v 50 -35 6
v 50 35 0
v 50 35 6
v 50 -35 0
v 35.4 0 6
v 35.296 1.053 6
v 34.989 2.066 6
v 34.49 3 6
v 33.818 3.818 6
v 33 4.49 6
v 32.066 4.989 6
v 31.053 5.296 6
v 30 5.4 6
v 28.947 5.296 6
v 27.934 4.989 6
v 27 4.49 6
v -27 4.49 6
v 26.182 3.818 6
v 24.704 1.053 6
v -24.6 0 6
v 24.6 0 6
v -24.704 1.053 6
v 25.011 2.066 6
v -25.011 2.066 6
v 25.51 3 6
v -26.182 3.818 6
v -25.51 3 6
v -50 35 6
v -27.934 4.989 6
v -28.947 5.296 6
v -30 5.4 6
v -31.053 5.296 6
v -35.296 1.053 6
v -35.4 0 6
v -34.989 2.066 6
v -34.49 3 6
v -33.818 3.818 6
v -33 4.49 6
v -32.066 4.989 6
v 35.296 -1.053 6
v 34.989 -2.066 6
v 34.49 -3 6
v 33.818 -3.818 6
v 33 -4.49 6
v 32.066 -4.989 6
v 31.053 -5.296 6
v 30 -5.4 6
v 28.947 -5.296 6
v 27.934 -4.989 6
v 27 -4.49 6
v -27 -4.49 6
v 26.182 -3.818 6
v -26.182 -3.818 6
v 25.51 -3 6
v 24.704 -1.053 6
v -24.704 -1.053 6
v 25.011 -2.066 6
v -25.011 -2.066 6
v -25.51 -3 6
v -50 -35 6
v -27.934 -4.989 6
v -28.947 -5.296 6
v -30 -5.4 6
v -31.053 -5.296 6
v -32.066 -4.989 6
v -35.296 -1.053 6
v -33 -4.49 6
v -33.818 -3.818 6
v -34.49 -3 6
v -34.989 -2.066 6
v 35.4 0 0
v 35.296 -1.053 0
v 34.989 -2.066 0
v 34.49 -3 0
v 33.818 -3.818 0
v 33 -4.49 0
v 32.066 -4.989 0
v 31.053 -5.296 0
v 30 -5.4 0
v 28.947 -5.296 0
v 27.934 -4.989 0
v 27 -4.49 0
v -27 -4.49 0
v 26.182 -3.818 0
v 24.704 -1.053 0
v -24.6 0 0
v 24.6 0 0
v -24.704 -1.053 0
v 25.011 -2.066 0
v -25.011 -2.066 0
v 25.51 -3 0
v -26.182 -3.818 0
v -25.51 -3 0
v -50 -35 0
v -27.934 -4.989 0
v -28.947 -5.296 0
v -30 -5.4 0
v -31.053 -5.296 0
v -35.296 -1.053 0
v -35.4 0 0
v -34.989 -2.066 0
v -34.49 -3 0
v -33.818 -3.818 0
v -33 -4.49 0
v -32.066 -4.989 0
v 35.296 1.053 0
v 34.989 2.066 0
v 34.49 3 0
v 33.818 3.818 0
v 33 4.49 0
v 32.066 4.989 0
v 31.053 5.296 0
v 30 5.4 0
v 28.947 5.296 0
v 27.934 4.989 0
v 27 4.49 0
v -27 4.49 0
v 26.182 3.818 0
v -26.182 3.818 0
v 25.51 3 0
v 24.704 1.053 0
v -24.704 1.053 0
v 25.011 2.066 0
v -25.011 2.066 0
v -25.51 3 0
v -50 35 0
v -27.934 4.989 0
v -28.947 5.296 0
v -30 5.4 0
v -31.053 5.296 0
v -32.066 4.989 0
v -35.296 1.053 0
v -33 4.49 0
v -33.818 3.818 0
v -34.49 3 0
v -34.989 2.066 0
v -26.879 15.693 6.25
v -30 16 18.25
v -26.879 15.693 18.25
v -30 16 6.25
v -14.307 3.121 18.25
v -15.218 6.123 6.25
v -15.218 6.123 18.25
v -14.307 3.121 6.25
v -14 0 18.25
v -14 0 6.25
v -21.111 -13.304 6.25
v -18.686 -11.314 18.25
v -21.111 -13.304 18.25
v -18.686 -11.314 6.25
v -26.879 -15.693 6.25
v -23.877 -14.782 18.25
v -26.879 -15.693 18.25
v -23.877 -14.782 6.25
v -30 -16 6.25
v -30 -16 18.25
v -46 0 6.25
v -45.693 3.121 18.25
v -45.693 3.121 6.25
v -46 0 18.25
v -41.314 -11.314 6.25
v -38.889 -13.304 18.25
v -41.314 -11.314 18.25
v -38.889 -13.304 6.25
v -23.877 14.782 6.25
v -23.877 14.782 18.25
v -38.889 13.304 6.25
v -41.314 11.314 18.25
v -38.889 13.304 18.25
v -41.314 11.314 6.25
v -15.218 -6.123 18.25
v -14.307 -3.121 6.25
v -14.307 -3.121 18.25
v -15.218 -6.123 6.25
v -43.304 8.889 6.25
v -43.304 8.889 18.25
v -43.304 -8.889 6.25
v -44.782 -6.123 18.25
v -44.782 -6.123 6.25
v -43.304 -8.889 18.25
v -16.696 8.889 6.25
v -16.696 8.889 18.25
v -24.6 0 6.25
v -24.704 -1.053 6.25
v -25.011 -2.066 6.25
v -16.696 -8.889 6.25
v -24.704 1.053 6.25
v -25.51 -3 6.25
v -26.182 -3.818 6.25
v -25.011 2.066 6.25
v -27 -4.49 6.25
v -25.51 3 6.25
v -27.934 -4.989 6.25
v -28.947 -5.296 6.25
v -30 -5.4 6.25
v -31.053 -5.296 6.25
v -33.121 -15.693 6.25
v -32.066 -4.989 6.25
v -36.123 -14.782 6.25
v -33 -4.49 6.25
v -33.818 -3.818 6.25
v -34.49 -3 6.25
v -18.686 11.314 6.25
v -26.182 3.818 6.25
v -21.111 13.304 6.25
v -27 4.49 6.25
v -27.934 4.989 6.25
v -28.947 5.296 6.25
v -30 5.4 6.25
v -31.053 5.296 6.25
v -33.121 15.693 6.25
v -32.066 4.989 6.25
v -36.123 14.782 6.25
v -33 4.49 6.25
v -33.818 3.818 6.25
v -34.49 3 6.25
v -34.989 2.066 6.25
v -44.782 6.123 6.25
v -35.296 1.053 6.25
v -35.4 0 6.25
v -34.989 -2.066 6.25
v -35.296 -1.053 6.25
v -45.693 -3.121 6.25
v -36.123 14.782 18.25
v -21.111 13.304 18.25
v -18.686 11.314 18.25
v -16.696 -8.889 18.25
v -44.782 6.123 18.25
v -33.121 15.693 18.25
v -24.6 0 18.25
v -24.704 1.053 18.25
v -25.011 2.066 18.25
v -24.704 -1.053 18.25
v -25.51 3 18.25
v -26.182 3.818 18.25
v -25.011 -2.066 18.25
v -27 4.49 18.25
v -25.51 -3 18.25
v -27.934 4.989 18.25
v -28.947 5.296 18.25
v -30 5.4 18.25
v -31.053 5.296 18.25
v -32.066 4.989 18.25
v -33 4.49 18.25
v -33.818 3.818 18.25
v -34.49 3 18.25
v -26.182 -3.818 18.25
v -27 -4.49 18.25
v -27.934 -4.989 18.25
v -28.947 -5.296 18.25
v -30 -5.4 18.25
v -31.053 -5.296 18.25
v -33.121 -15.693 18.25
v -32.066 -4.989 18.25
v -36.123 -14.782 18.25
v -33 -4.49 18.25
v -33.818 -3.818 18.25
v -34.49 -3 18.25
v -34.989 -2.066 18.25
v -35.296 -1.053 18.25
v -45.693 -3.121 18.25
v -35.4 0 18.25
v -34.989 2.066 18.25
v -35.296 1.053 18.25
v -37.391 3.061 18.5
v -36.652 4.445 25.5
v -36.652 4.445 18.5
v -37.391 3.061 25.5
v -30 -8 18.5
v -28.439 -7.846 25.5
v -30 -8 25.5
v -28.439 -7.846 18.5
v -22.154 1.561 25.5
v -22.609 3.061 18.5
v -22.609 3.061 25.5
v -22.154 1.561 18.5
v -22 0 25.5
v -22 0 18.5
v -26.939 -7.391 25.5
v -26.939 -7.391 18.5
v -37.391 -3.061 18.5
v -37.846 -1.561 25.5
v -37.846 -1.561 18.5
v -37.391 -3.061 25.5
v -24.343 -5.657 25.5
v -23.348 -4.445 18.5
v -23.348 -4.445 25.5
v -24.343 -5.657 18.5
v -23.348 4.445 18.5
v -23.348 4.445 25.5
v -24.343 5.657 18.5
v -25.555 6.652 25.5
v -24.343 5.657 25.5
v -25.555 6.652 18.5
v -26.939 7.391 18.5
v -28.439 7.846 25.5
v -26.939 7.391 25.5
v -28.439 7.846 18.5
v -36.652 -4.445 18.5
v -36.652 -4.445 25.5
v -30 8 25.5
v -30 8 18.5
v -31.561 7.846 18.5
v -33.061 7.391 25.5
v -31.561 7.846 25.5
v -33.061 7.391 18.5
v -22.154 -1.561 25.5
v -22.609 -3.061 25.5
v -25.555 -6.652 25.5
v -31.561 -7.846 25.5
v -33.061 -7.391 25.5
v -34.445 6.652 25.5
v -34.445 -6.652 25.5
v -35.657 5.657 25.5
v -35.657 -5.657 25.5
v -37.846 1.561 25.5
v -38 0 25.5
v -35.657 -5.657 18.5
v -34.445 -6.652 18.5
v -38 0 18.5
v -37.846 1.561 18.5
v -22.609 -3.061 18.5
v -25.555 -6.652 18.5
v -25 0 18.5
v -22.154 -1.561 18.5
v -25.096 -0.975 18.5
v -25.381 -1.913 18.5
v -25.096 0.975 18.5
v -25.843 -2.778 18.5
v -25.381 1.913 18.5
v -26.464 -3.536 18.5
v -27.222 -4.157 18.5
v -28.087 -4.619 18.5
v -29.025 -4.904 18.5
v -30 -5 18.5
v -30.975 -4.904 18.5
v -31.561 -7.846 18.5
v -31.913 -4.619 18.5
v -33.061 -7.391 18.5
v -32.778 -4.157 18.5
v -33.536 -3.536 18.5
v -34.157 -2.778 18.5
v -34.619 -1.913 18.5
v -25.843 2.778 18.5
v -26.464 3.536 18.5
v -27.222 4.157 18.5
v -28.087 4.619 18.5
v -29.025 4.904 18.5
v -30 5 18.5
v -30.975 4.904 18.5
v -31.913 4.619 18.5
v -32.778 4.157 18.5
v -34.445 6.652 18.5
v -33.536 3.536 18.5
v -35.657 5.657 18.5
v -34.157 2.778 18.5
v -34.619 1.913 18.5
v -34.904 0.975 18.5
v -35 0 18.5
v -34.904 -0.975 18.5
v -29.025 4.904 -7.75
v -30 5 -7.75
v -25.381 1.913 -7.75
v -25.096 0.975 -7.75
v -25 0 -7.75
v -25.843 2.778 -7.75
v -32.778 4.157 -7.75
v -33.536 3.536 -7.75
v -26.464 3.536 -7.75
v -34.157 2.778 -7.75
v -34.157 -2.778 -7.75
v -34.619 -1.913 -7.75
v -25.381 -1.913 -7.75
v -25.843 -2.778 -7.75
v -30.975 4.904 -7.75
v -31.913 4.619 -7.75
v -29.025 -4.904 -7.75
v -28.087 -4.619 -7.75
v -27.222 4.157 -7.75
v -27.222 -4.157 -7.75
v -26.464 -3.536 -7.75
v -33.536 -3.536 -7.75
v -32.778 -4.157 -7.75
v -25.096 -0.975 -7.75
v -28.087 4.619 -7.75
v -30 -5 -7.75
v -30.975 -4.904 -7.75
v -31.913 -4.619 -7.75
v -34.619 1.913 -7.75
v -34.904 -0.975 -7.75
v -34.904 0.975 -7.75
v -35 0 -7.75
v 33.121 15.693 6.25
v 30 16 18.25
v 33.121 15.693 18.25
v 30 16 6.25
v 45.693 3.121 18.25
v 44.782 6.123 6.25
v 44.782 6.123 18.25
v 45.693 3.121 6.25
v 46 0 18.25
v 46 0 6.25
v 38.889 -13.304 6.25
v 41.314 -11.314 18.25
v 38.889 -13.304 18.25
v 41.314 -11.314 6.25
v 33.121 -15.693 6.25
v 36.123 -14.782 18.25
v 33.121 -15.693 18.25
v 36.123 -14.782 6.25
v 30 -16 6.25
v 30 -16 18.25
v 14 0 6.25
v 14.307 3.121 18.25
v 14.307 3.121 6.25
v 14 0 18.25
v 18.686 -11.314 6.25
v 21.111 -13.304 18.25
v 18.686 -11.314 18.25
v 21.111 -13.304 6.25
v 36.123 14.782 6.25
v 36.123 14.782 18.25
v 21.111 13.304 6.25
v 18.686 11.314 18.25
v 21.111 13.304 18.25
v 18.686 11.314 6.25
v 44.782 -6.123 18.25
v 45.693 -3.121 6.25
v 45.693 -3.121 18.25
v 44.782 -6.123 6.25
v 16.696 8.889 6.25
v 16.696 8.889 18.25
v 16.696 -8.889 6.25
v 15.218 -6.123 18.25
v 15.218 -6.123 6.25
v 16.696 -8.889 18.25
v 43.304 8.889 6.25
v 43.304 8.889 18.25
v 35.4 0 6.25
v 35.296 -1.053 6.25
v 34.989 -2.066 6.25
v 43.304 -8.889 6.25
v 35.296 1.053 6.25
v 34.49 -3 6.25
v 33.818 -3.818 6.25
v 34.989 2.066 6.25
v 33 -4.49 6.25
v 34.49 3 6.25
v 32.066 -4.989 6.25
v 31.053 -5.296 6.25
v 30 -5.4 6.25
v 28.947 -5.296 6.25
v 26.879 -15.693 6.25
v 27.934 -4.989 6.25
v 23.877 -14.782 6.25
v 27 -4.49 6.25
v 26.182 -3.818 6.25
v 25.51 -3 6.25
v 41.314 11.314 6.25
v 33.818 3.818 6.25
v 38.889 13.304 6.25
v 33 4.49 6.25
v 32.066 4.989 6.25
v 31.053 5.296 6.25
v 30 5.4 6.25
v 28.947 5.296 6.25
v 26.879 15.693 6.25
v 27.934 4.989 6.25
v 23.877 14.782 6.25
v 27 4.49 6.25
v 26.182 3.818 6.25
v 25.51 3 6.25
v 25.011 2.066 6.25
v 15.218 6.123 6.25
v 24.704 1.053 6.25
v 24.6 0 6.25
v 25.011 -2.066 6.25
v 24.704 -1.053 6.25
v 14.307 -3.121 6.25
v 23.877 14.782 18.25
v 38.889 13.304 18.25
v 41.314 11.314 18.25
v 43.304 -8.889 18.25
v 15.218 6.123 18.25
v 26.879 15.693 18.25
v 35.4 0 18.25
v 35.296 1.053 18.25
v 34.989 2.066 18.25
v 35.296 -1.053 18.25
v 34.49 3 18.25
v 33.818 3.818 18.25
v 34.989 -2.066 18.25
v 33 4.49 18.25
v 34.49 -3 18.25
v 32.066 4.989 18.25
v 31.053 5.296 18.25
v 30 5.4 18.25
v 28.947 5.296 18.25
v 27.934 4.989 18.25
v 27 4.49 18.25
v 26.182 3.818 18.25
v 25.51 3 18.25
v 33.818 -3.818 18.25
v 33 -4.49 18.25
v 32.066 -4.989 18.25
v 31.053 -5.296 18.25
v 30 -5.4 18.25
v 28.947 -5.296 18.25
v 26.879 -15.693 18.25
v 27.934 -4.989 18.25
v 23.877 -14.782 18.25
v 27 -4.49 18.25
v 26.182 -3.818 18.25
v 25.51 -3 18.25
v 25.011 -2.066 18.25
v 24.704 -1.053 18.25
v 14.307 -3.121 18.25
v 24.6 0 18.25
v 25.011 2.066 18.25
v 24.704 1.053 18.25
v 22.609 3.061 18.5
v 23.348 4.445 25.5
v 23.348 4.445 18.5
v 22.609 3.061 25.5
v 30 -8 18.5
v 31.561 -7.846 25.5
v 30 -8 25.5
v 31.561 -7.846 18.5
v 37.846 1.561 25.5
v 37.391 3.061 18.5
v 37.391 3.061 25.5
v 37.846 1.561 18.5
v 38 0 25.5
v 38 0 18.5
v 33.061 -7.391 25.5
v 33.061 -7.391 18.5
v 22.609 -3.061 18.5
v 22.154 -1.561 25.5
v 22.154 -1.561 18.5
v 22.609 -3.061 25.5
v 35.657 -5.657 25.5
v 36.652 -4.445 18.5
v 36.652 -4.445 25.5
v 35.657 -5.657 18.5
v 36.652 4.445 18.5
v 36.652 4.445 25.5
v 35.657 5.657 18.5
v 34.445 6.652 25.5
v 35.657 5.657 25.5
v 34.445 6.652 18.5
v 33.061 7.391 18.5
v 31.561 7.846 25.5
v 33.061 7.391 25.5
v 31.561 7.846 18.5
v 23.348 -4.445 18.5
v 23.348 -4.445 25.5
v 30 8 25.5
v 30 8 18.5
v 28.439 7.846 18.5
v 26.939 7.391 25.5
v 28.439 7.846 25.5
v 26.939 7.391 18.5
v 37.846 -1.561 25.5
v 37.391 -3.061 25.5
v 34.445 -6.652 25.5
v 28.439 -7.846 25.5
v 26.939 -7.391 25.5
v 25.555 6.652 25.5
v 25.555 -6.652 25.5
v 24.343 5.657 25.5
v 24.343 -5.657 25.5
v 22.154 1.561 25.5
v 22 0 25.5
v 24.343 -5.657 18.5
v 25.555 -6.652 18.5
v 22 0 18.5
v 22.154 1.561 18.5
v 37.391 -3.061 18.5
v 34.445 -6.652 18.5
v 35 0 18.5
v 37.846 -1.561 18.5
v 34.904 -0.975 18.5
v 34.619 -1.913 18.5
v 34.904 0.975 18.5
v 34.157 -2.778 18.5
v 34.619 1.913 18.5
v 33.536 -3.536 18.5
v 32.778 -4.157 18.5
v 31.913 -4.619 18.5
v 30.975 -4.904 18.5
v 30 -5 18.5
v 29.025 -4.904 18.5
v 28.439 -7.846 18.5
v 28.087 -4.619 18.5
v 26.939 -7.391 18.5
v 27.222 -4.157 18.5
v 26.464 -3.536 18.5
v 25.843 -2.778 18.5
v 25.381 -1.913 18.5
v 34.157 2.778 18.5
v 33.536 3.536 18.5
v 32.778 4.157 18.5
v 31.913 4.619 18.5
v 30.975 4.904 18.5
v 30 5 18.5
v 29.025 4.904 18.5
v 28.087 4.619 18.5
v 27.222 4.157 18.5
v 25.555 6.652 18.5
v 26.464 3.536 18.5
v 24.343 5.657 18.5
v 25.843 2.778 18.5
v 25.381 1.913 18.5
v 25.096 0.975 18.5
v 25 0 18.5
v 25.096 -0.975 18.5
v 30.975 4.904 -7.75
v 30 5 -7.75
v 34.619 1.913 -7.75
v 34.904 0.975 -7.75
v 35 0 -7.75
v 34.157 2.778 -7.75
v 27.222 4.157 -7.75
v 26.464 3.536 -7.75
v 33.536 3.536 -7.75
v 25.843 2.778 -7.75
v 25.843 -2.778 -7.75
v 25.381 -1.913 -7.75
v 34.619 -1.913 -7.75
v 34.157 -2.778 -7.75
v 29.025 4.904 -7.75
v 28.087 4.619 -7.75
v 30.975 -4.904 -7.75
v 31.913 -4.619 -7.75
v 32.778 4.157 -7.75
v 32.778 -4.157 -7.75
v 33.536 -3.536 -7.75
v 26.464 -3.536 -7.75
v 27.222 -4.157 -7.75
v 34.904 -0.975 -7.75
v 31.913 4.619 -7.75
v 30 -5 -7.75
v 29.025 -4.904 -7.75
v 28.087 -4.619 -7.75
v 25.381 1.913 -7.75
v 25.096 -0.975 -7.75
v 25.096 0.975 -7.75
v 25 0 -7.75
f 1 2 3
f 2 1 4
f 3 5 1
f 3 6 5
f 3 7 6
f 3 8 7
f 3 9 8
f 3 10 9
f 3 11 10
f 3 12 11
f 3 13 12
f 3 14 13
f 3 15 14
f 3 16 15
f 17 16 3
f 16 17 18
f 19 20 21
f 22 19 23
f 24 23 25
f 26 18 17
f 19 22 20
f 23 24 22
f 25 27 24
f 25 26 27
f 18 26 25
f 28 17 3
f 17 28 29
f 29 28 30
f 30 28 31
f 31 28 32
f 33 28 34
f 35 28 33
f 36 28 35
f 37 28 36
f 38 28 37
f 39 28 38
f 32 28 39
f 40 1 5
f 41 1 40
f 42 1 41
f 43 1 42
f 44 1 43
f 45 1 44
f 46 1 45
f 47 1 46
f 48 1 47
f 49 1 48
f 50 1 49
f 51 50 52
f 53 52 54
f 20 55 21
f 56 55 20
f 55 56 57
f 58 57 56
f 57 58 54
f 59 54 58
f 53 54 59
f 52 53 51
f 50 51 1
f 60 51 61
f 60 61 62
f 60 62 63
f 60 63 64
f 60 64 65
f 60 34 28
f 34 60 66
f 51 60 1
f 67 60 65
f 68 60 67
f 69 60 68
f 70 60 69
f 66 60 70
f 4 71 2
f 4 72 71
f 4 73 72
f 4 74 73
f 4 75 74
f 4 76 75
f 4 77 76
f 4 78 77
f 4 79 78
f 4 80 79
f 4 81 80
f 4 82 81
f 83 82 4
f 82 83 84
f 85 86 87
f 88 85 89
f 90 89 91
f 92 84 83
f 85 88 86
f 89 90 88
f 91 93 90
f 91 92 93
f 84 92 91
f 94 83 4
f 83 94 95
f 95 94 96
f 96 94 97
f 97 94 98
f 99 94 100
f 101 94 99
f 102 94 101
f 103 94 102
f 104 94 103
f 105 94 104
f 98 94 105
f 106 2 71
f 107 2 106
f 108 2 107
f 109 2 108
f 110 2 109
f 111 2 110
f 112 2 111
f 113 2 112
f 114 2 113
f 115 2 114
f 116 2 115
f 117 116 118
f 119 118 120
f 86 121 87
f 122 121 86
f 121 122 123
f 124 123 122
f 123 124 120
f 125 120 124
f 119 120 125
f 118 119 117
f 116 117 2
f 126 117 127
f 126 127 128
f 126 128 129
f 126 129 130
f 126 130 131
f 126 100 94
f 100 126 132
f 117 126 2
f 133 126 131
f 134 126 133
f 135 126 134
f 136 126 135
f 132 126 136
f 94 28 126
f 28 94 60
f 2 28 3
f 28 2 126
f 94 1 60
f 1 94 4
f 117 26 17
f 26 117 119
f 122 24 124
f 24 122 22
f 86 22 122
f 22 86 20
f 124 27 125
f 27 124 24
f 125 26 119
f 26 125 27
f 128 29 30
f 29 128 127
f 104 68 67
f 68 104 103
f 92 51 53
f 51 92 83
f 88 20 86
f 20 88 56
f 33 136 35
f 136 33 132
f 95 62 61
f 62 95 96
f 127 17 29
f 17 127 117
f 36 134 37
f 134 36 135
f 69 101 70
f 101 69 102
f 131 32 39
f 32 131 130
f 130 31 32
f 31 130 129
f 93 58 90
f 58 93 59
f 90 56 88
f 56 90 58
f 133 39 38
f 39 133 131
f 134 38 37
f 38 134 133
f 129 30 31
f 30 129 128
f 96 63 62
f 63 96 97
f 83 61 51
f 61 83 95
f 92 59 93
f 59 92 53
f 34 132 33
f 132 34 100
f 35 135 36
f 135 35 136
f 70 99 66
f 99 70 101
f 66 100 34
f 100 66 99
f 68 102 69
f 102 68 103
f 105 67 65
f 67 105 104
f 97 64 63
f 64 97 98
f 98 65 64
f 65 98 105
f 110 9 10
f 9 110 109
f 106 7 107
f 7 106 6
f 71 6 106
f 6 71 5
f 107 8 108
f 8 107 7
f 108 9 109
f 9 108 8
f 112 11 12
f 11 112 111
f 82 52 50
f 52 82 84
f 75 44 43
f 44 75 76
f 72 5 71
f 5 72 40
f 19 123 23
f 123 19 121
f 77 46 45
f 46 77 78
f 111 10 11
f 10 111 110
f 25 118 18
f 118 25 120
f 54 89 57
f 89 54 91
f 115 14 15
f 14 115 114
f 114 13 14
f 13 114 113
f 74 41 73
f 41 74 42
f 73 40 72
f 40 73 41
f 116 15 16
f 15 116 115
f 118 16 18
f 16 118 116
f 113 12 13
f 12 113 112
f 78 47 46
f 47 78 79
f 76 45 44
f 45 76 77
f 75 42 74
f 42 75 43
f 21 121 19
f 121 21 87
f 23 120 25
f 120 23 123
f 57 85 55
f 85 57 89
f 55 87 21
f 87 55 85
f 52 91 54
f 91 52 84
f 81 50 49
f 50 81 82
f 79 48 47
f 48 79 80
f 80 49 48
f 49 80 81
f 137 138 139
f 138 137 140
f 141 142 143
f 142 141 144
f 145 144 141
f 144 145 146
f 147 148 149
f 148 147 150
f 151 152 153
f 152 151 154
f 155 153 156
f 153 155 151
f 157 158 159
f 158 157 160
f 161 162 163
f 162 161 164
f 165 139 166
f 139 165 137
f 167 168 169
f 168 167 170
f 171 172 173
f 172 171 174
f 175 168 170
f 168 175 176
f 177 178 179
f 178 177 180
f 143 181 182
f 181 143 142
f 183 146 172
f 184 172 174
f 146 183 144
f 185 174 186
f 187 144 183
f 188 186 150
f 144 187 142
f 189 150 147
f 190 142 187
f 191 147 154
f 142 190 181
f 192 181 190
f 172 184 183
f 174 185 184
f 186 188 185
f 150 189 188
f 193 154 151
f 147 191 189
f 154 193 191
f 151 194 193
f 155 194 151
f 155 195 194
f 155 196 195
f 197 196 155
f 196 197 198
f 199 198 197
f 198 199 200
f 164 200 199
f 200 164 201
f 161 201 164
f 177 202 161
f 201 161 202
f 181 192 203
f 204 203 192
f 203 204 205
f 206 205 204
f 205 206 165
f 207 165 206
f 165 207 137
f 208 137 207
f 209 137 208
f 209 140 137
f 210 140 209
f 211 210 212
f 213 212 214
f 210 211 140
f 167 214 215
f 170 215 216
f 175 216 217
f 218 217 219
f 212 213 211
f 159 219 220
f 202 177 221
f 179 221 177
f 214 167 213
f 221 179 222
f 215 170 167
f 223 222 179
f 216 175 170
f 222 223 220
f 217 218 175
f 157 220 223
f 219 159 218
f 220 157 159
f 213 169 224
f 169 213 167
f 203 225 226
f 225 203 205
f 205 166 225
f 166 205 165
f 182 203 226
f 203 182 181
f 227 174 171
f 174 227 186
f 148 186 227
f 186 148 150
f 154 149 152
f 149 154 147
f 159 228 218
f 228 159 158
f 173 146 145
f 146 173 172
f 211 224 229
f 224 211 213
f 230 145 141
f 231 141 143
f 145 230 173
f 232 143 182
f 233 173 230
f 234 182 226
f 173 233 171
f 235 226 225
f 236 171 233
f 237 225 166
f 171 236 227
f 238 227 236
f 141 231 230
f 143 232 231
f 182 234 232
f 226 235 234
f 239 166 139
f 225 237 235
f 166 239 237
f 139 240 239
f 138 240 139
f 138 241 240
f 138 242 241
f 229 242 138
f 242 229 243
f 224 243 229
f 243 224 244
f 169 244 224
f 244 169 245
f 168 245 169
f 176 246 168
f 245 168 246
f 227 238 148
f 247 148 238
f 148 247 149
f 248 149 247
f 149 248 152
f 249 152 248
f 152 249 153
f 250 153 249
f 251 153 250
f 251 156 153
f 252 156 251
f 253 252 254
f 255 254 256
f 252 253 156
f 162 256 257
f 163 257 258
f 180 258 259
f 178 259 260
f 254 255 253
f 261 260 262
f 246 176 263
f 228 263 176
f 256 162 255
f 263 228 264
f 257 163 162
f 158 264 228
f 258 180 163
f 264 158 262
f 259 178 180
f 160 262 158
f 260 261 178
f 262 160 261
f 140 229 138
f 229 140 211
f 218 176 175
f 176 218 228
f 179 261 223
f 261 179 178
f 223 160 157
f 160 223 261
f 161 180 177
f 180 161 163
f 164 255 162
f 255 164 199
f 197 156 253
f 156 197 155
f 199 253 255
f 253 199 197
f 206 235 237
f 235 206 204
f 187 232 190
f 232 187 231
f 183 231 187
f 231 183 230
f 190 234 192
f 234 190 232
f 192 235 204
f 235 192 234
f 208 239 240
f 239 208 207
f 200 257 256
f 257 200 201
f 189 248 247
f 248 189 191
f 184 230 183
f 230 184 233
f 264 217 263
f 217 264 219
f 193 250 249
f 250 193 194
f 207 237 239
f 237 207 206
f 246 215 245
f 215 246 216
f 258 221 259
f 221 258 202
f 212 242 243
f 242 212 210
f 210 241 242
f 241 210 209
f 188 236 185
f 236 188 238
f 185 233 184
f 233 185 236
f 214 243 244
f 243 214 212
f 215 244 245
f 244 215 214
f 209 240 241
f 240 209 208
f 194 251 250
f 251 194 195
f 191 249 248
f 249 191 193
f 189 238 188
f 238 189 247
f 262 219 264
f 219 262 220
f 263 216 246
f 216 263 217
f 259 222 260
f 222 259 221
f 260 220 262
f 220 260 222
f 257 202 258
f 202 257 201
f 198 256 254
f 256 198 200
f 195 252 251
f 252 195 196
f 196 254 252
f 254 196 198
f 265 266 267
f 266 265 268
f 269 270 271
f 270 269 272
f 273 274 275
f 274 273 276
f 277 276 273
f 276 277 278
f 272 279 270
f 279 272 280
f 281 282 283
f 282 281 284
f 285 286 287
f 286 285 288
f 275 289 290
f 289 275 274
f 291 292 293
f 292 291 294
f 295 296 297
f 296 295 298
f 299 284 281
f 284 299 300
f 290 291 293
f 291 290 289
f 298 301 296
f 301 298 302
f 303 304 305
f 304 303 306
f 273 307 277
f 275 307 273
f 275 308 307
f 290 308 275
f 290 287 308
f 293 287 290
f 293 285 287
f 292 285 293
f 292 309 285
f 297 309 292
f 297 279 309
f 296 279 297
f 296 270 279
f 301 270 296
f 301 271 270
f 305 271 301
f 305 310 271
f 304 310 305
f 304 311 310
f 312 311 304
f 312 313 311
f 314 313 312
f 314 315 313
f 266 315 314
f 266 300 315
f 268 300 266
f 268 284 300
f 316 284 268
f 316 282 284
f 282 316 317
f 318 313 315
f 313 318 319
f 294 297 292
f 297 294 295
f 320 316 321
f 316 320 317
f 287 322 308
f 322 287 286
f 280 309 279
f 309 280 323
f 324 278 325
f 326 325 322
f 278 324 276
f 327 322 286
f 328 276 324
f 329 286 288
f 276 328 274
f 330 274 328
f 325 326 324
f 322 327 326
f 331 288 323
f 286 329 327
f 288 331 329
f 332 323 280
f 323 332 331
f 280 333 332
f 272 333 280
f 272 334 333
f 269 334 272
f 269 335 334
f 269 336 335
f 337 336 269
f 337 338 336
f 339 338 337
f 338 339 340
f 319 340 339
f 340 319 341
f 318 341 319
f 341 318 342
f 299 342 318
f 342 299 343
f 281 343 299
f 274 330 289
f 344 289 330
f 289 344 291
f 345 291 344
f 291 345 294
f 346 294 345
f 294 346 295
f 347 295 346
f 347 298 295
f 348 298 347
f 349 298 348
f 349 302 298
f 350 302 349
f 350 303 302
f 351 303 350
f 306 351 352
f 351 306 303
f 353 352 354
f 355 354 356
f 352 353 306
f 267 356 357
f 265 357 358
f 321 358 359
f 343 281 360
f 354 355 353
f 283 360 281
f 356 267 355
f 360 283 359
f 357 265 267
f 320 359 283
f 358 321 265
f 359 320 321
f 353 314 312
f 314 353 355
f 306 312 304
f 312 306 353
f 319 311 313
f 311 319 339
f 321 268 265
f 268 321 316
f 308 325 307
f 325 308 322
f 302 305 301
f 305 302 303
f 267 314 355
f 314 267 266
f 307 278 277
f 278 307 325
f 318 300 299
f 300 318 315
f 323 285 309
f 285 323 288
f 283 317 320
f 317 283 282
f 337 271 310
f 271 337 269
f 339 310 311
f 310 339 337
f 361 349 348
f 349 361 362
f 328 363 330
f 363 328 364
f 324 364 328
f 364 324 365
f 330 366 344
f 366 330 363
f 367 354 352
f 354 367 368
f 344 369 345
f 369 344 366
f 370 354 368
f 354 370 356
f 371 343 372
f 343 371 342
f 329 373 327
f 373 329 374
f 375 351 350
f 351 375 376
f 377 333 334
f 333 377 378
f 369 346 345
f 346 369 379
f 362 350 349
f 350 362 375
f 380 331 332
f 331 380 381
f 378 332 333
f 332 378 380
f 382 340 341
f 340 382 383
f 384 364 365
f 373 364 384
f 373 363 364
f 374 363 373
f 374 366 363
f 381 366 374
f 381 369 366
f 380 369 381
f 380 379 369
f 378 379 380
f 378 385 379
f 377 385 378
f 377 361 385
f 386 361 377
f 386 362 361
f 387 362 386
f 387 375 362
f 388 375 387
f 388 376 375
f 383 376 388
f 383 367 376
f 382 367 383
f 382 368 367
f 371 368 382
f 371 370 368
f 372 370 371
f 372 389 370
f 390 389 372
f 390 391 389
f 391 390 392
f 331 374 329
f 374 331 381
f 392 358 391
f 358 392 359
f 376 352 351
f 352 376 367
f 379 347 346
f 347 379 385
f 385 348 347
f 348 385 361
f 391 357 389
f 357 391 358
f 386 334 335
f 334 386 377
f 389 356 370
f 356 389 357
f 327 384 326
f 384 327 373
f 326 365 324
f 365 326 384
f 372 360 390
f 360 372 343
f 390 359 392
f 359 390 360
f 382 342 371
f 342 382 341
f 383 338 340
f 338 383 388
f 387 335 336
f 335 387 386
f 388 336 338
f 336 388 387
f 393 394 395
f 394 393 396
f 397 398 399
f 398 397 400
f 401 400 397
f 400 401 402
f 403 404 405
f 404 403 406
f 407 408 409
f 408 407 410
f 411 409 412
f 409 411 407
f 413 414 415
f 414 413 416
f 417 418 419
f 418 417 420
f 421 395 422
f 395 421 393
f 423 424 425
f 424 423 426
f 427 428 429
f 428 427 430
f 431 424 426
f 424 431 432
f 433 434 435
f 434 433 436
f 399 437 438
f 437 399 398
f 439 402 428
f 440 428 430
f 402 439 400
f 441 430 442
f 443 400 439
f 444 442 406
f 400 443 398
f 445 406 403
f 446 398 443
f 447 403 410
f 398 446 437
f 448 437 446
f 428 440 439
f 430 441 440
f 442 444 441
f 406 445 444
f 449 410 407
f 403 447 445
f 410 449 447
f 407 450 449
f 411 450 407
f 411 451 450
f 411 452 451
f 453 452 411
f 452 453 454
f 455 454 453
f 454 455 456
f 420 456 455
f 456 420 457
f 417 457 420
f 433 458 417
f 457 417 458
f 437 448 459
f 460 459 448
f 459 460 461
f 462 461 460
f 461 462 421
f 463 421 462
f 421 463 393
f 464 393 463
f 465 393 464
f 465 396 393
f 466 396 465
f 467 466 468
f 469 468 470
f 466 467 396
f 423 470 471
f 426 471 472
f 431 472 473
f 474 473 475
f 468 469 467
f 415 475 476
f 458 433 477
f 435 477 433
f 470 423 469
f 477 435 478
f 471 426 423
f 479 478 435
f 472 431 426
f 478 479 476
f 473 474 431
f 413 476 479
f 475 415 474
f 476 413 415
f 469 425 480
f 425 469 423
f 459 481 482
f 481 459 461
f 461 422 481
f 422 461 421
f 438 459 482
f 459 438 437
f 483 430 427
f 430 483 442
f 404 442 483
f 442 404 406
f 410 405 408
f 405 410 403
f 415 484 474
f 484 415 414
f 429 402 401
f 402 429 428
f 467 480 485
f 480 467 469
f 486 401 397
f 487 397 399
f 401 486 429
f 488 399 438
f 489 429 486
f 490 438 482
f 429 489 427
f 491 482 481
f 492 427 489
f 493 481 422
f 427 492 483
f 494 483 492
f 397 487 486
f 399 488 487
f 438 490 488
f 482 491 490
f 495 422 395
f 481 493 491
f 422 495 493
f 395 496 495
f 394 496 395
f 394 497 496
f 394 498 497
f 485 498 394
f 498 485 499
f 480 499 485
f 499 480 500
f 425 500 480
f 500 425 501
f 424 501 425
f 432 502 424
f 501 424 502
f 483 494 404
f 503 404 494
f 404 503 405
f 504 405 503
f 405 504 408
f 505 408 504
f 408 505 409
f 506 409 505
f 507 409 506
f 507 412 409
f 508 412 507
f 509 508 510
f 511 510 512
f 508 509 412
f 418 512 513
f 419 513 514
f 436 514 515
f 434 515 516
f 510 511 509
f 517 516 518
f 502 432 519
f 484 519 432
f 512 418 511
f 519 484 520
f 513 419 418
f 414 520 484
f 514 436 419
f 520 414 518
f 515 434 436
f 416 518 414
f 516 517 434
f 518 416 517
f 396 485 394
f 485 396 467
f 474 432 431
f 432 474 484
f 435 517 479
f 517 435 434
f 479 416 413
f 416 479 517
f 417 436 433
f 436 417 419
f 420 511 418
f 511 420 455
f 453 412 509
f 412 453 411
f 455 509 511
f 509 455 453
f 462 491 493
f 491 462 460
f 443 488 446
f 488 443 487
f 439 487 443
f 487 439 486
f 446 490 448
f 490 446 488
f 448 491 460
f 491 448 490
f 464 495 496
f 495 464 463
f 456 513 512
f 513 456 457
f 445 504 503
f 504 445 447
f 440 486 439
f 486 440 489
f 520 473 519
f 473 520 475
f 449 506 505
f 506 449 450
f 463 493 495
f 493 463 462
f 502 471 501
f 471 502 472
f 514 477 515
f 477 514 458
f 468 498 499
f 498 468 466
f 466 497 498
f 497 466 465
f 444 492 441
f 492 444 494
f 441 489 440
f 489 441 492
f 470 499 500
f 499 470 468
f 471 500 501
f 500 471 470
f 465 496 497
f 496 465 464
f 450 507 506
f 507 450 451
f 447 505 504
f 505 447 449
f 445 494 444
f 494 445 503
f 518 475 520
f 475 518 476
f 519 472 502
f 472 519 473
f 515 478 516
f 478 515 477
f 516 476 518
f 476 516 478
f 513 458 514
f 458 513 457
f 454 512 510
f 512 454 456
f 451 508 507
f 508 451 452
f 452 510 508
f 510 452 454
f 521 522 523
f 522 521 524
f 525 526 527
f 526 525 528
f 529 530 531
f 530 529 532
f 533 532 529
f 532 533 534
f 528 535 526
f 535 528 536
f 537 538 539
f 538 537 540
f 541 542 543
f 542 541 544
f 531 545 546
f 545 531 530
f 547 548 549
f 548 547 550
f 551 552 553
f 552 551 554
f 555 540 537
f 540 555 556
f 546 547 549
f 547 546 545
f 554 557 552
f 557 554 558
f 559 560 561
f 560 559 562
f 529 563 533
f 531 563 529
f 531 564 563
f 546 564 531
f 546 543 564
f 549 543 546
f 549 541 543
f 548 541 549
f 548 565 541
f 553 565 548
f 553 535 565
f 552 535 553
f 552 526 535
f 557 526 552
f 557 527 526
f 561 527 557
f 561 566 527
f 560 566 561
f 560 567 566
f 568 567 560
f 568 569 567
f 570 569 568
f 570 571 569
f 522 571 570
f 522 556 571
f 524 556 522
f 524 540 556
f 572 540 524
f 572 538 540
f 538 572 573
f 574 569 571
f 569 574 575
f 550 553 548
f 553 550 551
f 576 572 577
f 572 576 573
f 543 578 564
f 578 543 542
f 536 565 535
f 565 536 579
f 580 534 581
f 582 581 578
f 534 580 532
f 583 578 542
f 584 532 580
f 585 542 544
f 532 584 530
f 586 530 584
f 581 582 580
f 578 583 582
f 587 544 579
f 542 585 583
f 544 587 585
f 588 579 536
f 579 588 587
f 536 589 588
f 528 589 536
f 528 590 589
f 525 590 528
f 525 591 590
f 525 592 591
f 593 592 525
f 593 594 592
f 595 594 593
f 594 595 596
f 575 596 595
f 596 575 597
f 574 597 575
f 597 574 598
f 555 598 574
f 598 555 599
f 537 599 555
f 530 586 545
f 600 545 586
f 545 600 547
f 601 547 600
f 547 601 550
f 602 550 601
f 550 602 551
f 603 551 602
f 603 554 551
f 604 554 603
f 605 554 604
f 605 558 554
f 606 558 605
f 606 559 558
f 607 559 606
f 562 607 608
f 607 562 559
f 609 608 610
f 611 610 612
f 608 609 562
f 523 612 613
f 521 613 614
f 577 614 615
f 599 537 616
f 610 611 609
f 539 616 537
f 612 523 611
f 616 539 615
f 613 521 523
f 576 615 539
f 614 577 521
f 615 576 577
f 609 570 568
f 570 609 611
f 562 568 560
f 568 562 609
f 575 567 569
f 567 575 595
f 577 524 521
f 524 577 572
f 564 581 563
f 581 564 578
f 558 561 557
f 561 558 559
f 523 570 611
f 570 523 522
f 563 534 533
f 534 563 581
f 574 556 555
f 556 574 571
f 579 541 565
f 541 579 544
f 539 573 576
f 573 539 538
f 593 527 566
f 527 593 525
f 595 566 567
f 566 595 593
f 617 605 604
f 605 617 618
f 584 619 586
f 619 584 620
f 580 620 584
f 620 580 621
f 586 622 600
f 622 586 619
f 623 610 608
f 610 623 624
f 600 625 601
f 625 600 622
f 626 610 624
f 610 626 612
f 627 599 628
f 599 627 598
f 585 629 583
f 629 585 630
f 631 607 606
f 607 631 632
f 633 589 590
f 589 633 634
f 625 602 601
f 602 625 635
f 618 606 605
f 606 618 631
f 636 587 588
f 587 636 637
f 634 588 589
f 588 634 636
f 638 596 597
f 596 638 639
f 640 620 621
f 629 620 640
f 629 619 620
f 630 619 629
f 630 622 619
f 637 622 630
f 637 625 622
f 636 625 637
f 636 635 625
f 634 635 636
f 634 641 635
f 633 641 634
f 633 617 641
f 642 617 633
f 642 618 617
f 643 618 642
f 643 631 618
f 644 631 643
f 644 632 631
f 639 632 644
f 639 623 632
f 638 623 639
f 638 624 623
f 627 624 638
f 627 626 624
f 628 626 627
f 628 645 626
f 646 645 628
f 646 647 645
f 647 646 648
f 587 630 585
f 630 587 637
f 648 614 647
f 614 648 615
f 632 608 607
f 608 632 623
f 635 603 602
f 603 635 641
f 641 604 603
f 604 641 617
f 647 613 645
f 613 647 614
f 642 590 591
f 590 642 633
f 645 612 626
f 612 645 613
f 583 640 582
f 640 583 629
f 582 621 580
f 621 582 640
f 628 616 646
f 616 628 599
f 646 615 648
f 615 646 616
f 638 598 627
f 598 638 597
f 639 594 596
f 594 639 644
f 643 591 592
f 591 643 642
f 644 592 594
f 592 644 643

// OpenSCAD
$fn = 32;

// ------------------------------------------------------------------------
// Standoff columns: 2 d32 standoffs, bolts d10
// Every part is its own module, assembly() places them once.
// ------------------------------------------------------------------------

// --- part 1 ---
module base_plate() {
  difference() {
    translate([-50, -35, 0]) cube([100, 70, 6]);
    translate([-30, 0, -1]) cylinder(h = 8, d = 10.8);
    translate([30, 0, -1]) cylinder(h = 8, d = 10.8);
  }
}

// --- part 2 ---
module spacer1() {
  difference() {
      translate([0, 0, 0]) cylinder(h = 12, d = 32);
      translate([0, 0, -1]) cylinder(h = 14, d = 10.8);
    }
}

// --- part 3 ---
module bolt1() {
  cylinder(h = 7, d = 16);
  translate([0, 0, -26.25]) cylinder(h = 26.25, d = 10);
}

// --- part 4 ---
module spacer2() {
  difference() {
      translate([0, 0, 0]) cylinder(h = 12, d = 32);
      translate([0, 0, -1]) cylinder(h = 14, d = 10.8);
    }
}

// --- part 5 ---
module bolt2() {
  cylinder(h = 7, d = 16);
  translate([0, 0, -26.25]) cylinder(h = 26.25, d = 10);
}

// --- assembly ---
module assembly() {
  translate([0, 0, 0]) rotate([0, 0, 0]) base_plate();
  translate([-30, 0, 6.25]) rotate([0, 0, 0]) spacer1();
  translate([-30, 0, 18.5]) rotate([0, 0, 0]) bolt1();
  translate([30, 0, 6.25]) rotate([0, 0, 0]) spacer2();
  translate([30, 0, 18.5]) rotate([0, 0, 0]) bolt2();
}

assembly();
